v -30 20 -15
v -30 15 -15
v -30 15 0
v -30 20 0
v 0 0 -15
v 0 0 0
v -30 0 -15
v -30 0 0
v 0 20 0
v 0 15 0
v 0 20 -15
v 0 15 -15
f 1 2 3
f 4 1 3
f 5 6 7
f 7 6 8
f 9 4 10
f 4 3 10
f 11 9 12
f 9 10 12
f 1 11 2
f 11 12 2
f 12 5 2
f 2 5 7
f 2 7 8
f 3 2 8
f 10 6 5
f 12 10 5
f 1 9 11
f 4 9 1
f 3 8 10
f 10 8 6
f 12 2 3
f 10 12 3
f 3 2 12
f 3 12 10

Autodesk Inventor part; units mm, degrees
ref_plane "YZ Plane" through (0, 0, 0) normal (1, 0, 0) x (0, 1, 0)
ref_plane "XZ Plane" through (0, 0, 0) normal (0, 1, 0) x (-1, 0, 0)
ref_plane "XY Plane" through (0, 0, 0) normal (0, 0, 1) x (1, 0, 0)
sketch "Sketch1" plane through (0, 0, 0) normal (0, 1, 0) x (-1, 0, 0)
  line L0 (30, 0) -> (0, 0)
  line L1 (0, 0) -> (0, -15)
  line L2 (0, -15) -> (30, -15)
  line L3 (30, -15) -> (30, 0)
  dimension "d0" = 30
  dimension "d1" = 15
extrude "Extrusion1" add sketch "Sketch1" along normal blind 20
ref_plane "Work Plane1" through (0, 15, 0) normal (0, 1, 0) x (1, 0, 0)
split body "Split1" result two bodies by plane through (0, 15, 0) normal (0, 1, 0) first body at (-10, 19.5, -5)
properties part number "enclosure_tests"
